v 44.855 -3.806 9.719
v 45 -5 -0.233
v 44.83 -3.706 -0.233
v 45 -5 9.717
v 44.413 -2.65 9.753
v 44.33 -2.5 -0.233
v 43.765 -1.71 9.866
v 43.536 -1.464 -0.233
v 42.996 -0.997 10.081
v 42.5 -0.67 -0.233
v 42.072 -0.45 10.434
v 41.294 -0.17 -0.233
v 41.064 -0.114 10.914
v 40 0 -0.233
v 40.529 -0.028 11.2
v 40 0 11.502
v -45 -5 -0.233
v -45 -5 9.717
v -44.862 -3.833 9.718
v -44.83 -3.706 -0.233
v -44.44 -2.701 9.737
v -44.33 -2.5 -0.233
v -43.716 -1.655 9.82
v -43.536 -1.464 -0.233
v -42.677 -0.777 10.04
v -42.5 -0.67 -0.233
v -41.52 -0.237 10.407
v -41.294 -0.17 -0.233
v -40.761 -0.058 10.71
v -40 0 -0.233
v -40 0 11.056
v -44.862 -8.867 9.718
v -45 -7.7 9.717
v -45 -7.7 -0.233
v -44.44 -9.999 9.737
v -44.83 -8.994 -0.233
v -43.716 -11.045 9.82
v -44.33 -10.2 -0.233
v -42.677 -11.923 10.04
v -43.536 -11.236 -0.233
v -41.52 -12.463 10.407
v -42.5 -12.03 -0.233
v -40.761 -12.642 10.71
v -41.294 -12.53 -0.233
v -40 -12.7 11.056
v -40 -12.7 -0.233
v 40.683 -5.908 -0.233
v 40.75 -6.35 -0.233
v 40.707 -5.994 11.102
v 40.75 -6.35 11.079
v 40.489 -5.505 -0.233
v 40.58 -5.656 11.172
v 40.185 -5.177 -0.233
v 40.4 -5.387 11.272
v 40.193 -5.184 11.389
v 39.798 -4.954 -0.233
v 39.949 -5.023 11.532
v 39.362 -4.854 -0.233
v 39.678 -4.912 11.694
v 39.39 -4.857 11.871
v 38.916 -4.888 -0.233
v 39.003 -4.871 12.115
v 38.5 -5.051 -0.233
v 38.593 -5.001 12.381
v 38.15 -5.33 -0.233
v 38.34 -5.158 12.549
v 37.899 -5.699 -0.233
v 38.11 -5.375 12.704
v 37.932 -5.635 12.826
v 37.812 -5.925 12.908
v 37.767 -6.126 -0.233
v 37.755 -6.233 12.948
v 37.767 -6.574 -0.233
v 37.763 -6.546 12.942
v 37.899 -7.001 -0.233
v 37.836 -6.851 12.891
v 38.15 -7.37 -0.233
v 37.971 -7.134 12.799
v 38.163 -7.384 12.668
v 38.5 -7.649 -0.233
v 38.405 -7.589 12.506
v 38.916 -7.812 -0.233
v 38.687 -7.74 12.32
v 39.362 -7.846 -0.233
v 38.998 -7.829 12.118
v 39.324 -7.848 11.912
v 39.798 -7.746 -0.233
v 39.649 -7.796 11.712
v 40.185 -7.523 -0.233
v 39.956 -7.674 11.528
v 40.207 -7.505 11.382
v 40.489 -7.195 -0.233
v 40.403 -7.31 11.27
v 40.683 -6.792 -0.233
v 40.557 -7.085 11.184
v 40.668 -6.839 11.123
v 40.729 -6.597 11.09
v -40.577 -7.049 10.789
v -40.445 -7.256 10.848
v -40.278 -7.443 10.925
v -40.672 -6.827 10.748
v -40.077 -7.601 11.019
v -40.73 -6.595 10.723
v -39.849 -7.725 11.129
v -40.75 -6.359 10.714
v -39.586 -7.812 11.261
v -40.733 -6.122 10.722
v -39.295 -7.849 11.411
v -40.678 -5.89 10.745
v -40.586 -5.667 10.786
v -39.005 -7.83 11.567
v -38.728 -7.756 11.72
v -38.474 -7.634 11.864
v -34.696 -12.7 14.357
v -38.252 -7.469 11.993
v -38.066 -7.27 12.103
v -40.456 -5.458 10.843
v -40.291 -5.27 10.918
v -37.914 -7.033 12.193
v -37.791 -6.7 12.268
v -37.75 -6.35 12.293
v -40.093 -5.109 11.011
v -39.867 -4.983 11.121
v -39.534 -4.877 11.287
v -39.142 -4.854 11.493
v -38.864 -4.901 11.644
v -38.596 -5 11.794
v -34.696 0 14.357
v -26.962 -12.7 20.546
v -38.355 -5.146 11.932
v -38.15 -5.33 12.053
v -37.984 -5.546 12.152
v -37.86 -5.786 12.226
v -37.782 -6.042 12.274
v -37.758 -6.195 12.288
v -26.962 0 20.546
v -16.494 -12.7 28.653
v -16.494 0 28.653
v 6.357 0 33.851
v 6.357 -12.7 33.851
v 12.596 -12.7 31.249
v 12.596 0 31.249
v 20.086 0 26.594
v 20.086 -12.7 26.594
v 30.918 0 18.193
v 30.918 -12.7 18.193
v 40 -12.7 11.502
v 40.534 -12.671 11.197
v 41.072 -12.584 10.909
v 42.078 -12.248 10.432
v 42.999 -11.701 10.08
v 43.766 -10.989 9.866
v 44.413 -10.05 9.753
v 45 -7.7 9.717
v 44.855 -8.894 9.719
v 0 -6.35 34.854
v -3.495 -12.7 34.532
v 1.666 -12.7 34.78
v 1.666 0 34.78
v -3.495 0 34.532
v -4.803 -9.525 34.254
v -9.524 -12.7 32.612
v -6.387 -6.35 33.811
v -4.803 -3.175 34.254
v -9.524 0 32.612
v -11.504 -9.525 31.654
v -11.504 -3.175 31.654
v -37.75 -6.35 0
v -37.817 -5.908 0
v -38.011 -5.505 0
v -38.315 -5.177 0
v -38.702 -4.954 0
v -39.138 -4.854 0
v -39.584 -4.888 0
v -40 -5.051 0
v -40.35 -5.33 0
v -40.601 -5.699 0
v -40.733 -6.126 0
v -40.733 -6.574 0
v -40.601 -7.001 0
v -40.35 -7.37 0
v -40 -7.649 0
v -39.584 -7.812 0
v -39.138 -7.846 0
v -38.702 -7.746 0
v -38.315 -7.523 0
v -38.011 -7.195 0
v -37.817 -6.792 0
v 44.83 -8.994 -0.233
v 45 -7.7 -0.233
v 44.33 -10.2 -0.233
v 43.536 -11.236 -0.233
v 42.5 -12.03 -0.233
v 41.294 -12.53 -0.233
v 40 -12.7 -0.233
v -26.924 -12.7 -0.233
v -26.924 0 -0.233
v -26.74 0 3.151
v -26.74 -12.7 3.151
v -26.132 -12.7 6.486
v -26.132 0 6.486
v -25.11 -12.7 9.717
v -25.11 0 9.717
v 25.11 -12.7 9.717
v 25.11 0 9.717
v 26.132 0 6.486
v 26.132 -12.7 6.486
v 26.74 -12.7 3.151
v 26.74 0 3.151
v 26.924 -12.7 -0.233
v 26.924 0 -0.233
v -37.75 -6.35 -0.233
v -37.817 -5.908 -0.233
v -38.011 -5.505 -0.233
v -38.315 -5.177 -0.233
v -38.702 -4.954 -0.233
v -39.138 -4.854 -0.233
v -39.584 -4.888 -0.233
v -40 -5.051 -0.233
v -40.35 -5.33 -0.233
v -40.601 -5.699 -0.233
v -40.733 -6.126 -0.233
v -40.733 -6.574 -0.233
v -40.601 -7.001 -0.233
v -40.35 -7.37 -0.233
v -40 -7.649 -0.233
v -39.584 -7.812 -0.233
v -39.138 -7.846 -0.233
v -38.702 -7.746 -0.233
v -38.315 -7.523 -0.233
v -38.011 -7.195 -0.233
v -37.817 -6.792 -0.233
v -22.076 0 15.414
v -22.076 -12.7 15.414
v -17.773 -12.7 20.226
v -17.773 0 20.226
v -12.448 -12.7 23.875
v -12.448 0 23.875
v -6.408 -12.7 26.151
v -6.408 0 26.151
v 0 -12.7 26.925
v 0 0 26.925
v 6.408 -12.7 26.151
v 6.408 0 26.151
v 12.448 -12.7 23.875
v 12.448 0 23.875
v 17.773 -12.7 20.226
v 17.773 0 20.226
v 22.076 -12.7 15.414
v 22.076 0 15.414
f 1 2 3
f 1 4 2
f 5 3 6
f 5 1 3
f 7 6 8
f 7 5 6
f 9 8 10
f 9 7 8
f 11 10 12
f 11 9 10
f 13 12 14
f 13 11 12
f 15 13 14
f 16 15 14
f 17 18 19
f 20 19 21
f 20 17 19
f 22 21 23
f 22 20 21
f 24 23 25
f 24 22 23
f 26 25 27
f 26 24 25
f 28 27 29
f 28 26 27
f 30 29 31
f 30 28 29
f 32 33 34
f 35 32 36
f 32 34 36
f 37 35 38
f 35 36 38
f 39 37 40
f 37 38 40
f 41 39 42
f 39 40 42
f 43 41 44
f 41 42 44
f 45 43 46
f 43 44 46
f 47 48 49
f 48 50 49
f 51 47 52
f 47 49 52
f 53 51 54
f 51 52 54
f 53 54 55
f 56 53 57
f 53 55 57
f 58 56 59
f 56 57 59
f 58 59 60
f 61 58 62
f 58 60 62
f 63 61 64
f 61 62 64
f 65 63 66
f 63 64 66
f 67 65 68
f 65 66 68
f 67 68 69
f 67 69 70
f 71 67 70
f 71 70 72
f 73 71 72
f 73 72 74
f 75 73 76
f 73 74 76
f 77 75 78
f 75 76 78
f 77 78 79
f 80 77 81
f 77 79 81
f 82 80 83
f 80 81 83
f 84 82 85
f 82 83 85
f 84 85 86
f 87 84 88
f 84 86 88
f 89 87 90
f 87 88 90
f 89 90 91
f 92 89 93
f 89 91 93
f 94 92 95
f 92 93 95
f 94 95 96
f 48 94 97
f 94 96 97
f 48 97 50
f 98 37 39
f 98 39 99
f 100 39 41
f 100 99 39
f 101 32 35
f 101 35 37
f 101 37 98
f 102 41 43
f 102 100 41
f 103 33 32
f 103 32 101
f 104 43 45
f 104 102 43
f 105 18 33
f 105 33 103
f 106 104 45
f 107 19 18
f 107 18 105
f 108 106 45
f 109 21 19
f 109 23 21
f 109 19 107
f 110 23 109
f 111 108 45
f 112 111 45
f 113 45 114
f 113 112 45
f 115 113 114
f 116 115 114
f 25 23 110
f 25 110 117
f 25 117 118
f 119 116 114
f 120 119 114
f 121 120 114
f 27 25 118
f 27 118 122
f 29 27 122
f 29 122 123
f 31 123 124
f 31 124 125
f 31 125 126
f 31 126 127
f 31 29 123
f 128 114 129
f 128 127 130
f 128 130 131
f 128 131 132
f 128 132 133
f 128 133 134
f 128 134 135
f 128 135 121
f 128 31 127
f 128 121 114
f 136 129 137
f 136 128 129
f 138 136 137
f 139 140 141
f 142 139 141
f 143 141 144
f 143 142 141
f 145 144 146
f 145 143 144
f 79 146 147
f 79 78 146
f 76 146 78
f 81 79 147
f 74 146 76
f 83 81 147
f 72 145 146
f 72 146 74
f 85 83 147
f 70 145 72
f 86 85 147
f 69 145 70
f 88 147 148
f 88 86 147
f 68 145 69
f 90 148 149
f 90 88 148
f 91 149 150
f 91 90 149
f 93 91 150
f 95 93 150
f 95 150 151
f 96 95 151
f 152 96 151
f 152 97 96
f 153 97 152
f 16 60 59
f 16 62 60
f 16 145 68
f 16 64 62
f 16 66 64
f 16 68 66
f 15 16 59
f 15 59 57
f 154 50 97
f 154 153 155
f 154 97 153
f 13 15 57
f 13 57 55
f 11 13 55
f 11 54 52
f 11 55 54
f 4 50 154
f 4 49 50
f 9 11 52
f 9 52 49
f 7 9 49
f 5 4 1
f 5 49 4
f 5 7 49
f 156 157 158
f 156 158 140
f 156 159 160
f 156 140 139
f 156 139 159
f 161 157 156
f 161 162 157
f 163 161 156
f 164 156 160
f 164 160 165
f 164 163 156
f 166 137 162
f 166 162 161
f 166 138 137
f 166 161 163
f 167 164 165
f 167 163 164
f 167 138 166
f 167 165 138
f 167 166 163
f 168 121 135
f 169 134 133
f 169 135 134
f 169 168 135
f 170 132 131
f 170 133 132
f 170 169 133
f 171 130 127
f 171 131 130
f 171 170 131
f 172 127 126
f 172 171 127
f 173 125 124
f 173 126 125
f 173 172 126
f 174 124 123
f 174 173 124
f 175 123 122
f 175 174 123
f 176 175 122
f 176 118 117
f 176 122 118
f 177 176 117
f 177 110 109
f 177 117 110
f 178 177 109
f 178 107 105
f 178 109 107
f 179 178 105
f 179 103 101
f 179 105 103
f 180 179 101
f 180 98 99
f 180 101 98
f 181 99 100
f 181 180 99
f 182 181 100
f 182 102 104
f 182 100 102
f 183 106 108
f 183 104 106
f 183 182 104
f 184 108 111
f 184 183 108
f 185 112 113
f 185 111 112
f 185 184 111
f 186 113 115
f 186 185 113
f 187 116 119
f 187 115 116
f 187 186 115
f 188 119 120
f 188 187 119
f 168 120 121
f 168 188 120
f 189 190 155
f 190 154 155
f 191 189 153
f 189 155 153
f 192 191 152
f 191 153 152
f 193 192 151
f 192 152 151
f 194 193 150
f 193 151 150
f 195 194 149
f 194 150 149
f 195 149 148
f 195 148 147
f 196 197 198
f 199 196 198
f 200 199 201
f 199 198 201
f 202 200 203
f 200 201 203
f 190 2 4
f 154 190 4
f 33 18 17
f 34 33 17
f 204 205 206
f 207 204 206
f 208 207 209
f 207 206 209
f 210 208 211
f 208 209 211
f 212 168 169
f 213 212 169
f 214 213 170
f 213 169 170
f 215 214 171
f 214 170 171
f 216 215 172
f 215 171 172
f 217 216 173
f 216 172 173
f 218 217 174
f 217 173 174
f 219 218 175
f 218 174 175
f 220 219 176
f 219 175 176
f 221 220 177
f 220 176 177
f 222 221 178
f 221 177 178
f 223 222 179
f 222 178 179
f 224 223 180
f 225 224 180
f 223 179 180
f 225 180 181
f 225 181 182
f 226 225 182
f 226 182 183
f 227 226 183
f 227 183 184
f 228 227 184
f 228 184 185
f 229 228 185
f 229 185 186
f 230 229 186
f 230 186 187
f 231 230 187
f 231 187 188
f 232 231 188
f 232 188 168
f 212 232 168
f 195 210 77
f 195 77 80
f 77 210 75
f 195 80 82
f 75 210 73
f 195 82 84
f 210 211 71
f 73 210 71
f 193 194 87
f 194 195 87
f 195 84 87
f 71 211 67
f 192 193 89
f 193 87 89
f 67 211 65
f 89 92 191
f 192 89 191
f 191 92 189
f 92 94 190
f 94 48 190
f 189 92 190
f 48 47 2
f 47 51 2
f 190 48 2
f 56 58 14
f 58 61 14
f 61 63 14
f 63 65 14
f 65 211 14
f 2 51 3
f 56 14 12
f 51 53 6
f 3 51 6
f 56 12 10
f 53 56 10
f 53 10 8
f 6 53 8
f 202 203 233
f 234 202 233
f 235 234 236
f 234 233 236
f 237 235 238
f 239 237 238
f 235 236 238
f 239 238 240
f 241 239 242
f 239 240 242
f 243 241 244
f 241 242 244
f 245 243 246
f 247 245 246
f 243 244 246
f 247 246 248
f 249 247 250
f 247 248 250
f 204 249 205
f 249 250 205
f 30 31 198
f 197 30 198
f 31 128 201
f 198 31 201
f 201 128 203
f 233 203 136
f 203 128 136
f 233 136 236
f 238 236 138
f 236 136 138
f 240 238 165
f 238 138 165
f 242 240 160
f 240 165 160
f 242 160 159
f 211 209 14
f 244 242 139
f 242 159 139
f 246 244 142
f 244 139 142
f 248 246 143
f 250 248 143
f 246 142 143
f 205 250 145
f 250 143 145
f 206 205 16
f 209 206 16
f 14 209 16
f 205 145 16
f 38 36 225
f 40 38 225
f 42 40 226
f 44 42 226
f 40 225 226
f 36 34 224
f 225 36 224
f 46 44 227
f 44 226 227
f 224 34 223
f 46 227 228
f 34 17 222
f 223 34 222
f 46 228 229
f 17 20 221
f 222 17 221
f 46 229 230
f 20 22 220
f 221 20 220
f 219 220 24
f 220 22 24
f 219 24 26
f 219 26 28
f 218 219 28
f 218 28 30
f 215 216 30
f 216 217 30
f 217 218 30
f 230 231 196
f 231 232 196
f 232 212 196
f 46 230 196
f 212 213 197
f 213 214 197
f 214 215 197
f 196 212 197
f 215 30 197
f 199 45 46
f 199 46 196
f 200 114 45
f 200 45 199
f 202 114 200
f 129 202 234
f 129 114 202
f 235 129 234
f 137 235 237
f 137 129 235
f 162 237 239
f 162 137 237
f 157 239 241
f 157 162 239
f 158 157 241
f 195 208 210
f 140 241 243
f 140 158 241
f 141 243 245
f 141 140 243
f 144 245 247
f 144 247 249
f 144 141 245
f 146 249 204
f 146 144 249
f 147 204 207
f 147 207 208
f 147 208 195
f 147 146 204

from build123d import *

# Parameters (mm, degrees)
F1_DEPTH = 12.7
F2_R     = 5
F3_R     = 1.5
F4_DEPTH = 15.1


# Not quite as in the source:
# - a feature names something its author has since deleted; it is built from what else it names


with BuildPart() as f1:
    # F0 (on Front) → F1 (new body)
    with BuildSketch(Plane.XZ):
        with BuildLine():
            Line((26.9239949913, -0.2326342749), (45, -0.2326342749))
            Line((45, -0.2326342749), (45, 9.7171152011))
            Line((45, 9.7171152011), (25.1104220827, 9.7171152011))
            ThreePointArc((25.1104220827, 9.7171152011), (26.4885733613, 4.828157649), (26.9239949913, -0.2326342749))
        make_face()
        with BuildLine():
            Line((25.1104220827, 9.7171152011), (45, 9.7171152011))
            add(Edge.make_bspline(
                [(-45, 9.7171152011), (-33.7651185691, 9.7171152011), (-1.2770984322, 59.9914556369), (36.3193154335, 9.7171152011), (45, 9.7171152011)],
                knots=[0, 0, 0, 0, 0.5, 1, 1, 1, 1], degree=3))
            Line((-45, 9.7171152011), (-25.1104220827, 9.7171152011))
            ThreePointArc((-25.1104220827, 9.7171152011), (0, 26.925), (25.1104220827, 9.7171152011))
        make_face()
        with BuildLine():
            Line((-25.1104220827, 9.7171152011), (-45, 9.7171152011))
            Line((-45, 9.7171152011), (-45, -0.2326342749))
            Line((-45, -0.2326342749), (-26.9239949913, -0.2326342749))
            ThreePointArc((-26.9239949913, -0.2326342749), (-26.4885733613, 4.828157649), (-25.1104220827, 9.7171152011))
        make_face()
    extrude(amount=F1_DEPTH)

    # F2
    f2_edges = [f1.edges().sort_by_distance(p)[0] for p in [
        (-45, -12.7, 4.74224),
        (-45, 0, 4.74224),
        (45, -12.7, 4.74224),
        (45, 0, 4.74224),
    ]]
    fillet(f2_edges, radius=F2_R)

    # F3 (on Top) → F4 (cut, symmetric)
    with BuildSketch(Plane.XY):
        with Locations((-39.25, -6.35)):
            Circle(F3_R)
        with Locations((39.25, -6.35)):
            Circle(F3_R)
    extrude(amount=F4_DEPTH, both=True, mode=Mode.SUBTRACT)


solid = f1.part
